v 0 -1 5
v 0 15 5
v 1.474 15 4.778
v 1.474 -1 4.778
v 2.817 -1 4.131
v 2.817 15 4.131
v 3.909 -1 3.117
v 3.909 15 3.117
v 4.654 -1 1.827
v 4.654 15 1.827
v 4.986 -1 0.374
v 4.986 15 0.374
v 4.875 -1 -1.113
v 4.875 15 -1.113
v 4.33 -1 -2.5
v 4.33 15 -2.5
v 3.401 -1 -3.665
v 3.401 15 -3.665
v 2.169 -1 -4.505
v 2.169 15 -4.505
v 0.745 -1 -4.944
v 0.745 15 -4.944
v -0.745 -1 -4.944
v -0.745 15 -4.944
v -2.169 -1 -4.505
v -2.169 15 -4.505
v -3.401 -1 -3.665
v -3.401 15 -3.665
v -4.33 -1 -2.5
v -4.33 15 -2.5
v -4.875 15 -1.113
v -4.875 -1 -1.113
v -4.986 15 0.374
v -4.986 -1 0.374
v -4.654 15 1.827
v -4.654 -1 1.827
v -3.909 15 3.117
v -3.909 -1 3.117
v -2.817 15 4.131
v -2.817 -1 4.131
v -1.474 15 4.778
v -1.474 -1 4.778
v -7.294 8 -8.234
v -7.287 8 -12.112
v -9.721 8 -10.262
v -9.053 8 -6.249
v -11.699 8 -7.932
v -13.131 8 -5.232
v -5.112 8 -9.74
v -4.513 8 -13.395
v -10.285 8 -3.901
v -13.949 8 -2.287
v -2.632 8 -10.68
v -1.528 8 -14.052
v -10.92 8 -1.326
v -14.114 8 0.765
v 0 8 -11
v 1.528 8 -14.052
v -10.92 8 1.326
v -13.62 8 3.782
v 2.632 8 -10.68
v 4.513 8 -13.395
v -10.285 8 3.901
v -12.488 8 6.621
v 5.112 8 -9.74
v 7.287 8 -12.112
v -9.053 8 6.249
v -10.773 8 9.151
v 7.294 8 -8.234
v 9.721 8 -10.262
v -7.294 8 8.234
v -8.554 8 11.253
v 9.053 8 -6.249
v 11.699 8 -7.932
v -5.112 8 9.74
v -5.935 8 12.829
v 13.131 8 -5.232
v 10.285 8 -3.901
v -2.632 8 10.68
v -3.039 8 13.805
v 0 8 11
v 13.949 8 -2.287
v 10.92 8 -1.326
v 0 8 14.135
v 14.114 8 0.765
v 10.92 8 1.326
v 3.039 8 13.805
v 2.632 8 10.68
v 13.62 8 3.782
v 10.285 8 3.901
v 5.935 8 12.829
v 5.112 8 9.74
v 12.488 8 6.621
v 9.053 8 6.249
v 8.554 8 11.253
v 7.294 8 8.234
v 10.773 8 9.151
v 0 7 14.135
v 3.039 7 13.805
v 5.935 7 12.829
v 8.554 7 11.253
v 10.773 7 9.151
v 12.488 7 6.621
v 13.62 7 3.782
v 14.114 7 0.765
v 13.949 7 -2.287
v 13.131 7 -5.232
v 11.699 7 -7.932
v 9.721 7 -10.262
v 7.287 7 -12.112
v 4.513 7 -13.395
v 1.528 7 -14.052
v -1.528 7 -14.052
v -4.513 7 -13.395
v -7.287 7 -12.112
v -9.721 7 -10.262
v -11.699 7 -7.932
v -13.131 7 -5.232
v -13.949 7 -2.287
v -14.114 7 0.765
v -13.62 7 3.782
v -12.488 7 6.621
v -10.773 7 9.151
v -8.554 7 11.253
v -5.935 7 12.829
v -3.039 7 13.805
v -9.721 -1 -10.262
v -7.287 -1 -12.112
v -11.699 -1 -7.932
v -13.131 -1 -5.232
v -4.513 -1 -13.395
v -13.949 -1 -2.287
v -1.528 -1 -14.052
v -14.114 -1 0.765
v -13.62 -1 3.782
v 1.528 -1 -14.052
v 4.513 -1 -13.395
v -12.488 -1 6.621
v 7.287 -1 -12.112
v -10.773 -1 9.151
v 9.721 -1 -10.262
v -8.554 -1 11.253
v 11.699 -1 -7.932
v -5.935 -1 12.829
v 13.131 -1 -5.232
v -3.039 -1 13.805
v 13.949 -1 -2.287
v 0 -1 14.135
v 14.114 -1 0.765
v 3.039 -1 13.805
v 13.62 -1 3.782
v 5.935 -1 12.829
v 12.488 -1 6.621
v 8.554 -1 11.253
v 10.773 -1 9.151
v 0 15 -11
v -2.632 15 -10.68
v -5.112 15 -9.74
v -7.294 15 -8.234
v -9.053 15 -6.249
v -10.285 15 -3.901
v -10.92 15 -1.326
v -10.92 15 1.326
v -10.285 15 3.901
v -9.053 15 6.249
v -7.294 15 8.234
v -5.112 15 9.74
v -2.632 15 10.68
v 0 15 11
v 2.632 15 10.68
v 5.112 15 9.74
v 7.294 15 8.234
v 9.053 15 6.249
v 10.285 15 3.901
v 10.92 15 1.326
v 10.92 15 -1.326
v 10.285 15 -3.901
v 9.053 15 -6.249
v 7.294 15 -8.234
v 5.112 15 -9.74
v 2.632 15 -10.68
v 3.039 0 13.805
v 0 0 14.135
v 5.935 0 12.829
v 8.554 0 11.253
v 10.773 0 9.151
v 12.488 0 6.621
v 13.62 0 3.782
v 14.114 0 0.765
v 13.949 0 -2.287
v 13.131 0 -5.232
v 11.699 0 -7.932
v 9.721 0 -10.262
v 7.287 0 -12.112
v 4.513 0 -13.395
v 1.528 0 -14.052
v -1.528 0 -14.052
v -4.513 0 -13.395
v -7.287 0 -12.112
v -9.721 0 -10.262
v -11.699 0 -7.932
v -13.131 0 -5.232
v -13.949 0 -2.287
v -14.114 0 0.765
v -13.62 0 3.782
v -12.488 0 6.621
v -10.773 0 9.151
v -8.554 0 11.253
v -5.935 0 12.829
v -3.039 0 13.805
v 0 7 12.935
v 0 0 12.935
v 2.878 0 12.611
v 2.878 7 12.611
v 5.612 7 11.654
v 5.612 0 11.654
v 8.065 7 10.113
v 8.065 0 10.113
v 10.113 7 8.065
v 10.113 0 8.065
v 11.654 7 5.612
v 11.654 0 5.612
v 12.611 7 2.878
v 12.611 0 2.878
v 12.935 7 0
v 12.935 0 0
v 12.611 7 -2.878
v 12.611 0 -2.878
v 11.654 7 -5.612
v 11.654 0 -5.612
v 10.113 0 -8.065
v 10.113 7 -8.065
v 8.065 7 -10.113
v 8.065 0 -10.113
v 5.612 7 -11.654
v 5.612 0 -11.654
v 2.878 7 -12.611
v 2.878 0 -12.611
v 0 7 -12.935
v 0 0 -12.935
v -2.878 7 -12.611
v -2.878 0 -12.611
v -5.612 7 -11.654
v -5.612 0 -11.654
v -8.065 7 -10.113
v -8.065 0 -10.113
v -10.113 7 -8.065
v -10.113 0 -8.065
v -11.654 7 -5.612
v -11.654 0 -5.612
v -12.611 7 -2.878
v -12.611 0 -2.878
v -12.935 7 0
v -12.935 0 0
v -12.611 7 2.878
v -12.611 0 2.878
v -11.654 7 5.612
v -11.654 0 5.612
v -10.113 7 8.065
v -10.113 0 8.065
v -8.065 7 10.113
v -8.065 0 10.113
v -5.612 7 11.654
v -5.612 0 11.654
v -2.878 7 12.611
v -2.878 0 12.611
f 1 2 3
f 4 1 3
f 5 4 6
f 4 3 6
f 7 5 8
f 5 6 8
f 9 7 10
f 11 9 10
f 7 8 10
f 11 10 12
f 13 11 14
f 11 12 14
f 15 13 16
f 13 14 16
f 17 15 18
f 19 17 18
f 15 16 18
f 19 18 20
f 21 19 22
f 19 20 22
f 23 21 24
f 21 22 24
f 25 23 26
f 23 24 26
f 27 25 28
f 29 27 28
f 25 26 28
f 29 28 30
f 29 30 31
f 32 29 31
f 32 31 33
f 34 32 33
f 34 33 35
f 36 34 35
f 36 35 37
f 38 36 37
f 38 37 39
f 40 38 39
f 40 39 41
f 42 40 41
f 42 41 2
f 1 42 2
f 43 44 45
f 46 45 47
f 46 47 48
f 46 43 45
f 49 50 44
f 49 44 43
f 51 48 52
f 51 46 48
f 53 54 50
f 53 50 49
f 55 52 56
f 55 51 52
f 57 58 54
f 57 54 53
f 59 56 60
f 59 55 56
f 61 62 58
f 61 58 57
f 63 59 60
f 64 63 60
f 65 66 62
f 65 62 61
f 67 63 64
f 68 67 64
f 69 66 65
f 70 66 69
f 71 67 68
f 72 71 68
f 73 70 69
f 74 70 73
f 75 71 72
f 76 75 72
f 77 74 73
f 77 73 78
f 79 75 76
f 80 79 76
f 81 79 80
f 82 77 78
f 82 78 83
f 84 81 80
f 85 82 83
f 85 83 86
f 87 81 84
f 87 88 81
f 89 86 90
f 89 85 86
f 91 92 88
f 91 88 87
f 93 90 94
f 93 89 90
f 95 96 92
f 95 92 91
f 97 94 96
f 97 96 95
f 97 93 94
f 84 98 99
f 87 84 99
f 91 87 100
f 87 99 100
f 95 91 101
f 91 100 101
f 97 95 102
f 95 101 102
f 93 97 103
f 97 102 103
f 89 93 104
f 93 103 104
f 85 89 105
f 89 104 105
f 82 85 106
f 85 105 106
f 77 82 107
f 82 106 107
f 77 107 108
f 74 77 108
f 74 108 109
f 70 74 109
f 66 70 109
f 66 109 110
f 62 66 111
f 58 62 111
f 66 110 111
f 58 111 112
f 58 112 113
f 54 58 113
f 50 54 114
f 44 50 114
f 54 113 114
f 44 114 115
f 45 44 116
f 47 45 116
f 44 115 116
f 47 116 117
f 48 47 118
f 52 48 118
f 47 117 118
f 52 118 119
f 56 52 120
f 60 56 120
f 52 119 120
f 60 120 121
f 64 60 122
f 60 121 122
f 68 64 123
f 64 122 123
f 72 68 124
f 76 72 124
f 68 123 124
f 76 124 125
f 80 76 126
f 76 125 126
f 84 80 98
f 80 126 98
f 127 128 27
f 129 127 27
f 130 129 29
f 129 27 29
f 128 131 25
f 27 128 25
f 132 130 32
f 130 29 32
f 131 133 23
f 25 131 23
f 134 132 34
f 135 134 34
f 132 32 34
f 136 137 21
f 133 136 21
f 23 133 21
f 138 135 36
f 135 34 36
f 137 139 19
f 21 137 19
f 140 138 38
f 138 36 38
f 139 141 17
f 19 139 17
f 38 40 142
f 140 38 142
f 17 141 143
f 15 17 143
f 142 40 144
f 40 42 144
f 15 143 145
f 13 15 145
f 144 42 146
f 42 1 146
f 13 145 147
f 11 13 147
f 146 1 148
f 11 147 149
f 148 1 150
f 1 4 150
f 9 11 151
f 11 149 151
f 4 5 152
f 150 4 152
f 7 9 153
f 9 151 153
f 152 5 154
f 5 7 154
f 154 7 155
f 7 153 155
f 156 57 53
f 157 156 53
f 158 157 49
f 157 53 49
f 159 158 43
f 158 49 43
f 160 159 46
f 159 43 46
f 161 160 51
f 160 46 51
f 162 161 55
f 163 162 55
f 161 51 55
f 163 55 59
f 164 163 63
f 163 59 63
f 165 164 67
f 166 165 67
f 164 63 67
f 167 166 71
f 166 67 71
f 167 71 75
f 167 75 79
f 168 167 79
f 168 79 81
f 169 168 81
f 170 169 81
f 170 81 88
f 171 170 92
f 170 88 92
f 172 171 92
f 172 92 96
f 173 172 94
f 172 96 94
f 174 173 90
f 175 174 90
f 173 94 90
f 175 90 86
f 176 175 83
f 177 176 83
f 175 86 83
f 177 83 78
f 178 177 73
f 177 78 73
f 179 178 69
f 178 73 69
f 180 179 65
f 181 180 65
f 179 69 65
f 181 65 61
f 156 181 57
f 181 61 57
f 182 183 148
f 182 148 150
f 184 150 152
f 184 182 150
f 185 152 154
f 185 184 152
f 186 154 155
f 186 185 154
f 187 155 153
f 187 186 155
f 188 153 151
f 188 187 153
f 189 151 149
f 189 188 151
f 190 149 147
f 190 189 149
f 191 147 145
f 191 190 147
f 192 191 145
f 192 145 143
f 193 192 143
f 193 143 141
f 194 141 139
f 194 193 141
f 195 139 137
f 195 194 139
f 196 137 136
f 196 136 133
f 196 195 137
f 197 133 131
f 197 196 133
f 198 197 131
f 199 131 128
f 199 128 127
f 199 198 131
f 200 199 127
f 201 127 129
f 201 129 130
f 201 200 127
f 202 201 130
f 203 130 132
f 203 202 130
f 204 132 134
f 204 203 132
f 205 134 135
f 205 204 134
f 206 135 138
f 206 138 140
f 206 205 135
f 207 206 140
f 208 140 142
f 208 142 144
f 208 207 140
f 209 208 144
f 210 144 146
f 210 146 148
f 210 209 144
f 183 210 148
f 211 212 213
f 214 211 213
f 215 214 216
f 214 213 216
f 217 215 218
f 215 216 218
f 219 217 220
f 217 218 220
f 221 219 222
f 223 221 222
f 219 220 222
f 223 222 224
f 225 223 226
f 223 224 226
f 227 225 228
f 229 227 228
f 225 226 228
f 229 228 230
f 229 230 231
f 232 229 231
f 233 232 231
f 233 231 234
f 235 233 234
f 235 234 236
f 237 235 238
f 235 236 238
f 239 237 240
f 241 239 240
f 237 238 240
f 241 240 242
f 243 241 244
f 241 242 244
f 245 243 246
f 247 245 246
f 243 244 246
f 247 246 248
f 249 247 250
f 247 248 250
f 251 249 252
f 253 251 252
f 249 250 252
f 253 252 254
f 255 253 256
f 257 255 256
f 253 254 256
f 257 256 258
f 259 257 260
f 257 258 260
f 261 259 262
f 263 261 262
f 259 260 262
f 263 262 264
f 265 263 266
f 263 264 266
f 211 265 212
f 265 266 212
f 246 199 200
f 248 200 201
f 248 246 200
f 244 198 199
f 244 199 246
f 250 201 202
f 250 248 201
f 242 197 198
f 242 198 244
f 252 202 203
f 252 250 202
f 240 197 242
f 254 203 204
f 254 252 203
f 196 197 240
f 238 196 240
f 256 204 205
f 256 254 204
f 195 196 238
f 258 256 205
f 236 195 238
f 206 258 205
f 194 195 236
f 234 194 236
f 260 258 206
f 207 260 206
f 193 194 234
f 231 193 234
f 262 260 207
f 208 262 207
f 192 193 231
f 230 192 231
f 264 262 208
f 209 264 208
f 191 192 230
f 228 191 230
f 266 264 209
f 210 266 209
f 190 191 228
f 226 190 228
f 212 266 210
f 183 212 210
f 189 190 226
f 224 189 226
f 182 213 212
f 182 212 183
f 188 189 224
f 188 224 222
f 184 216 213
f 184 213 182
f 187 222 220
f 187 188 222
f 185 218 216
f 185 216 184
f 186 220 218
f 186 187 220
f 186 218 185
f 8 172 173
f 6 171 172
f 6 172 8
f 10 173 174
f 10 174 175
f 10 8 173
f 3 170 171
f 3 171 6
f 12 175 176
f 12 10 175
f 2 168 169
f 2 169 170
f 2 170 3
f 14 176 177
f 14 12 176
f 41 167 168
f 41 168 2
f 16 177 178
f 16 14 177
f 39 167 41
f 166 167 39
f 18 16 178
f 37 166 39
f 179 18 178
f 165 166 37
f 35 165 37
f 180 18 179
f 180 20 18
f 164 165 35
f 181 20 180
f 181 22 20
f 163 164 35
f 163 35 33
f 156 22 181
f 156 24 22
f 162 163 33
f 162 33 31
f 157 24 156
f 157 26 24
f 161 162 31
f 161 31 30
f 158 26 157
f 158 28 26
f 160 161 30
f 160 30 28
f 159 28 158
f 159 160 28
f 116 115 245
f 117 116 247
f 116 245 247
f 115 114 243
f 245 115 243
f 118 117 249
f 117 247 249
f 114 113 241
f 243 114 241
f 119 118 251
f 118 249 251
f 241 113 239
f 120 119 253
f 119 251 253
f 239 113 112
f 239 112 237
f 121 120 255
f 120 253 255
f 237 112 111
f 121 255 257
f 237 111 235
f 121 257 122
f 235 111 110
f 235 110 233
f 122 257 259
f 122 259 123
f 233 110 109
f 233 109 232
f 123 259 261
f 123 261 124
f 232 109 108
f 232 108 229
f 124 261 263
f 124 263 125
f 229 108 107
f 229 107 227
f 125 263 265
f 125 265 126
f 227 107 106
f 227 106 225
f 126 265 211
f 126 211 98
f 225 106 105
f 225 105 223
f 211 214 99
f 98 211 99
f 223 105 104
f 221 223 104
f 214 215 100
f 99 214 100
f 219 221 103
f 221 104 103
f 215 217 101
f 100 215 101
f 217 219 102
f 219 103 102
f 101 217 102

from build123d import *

# Parameters (mm, degrees)
SKETCH_1_R          = 12.935
EXTRUDE_1_DEPTH     = 7
SKETCH_2_R          = 14.135
EXTRUDE_2_DEPTH     = 1
SKETCH_3_R          = 11
EXTRUDE_3_DEPTH     = 7
SKETCH_4_R          = 5
CUT_EXTRUDE_1_DEPTH = 26.604617748


with BuildPart() as part:
    # 草图1 → 凸台-拉伸1 (new body)
    with BuildSketch(Plane(origin=(0, 0, 0), x_dir=(1, 0, 0), z_dir=(0, 1, 0))):
        with Locations(Location((0, 0, 0), (0, 0, 270))):
            Circle(SKETCH_1_R)
    extrude(amount=EXTRUDE_1_DEPTH)

    # 草图2 → 凸台-拉伸2 (add)
    with BuildSketch(Plane(origin=(0, 7, 0), x_dir=(1, 0, 0), z_dir=(0, 1, 0))):
        with Locations(Location((0, 0, 0), (0, 0, 270))):
            Circle(SKETCH_2_R)
    extrude_2 = extrude(amount=EXTRUDE_2_DEPTH)

    # 镜向1: 凸台-拉伸2 across plane
    add(extrude_2.mirror(Plane.ZX.offset(3.5)))

    # 草图3 → 凸台-拉伸3 (add)
    with BuildSketch(Plane(origin=(0, 8, 0), x_dir=(1, 0, 0), z_dir=(0, 1, 0))):
        with Locations(Location((0, 0, 0), (0, 0, 90))):
            Circle(SKETCH_3_R)
    extrude(amount=EXTRUDE_3_DEPTH)

    # 草图4 → 切除-拉伸1 (cut, through all)
    with BuildSketch(Plane(origin=(0, 15, 0), x_dir=(1, 0, 0), z_dir=(0, 1, 0))):
        with Locations(Location((0, 0, 0), (0, 0, 270))):
            Circle(SKETCH_4_R)
    extrude(amount=-CUT_EXTRUDE_1_DEPTH, mode=Mode.SUBTRACT)


solid = part.part
